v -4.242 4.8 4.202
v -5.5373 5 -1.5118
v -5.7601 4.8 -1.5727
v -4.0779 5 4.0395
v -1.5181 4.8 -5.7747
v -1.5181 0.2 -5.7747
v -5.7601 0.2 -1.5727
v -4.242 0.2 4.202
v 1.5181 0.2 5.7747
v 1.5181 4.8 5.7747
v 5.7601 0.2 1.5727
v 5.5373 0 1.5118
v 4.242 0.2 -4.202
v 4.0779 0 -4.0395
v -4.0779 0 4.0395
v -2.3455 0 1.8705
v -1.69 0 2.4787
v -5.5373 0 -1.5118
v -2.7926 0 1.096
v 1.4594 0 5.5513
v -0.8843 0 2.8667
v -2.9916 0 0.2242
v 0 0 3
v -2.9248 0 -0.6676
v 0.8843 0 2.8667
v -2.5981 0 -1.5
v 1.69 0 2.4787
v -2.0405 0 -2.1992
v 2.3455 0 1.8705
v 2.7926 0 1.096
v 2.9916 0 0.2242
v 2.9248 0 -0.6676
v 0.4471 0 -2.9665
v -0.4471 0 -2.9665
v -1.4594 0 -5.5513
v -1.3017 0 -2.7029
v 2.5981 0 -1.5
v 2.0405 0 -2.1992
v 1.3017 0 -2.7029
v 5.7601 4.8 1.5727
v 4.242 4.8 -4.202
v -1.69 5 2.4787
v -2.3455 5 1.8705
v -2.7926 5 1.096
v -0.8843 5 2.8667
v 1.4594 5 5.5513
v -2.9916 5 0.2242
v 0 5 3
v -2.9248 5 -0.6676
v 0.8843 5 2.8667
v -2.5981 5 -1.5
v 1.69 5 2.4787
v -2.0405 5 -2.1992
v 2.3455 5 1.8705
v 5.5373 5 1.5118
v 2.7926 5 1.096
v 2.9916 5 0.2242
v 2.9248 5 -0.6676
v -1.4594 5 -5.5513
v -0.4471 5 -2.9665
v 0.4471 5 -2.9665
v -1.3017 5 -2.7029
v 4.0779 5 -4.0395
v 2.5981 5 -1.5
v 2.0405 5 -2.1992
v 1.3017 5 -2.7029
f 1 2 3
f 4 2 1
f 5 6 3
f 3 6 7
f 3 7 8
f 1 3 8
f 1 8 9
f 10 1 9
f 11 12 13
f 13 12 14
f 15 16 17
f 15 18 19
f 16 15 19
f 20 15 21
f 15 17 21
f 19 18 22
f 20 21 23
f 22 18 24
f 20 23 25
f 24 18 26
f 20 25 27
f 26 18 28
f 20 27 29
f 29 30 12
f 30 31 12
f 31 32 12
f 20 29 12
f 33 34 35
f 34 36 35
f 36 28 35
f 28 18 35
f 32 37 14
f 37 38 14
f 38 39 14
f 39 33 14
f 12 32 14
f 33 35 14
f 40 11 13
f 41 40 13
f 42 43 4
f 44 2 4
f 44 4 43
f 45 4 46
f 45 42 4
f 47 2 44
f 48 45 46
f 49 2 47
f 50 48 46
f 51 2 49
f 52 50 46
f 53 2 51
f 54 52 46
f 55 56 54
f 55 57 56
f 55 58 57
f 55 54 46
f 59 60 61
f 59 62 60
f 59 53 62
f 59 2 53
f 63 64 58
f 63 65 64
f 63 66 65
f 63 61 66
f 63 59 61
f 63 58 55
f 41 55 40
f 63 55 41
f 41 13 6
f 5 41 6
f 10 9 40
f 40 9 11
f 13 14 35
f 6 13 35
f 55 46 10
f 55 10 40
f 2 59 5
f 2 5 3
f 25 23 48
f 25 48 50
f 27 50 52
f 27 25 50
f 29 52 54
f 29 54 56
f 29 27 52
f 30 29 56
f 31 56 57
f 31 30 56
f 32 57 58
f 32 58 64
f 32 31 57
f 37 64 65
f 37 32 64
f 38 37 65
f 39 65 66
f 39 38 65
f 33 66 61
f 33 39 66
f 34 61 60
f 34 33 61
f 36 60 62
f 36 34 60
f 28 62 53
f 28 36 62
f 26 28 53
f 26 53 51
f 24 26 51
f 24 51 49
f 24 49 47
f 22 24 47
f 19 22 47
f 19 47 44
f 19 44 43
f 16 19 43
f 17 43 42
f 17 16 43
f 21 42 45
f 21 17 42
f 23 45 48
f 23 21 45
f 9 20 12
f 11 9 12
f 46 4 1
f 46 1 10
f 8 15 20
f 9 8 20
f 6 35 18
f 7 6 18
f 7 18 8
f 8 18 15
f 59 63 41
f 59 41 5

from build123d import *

# Parameters (mm, degrees)
SKETCH1_R           = 3
BOSS_EXTRUDE1_DEPTH = 5
CHAMFER2_SIZE       = 0.2


with BuildPart() as part:
    # Sketch1 → Boss-Extrude1 (new body)
    with BuildSketch(Plane(origin=(0, 0, 0), x_dir=(1, 0, 0), z_dir=(0, 1, 0))):
        Polygon((-4.241992166, -4.202035335), (1.518073264, -5.774690646), (5.760065431, -1.572655311), (4.241992166, 4.202035335), (-1.518073264, 5.774690646), (-5.760065431, 1.572655311), align=None)
        with Locations(Location((0, 0, 0), (0, 0, 270))):
            Circle(SKETCH1_R, mode=Mode.SUBTRACT)
    extrude(amount=BOSS_EXTRUDE1_DEPTH)

    # Chamfer2
    chamfer2_edges = [part.edges().sort_by_distance(p)[0] for p in [
        (3.639069348, 5, 3.673672979),
        (5.001028798, 5, -1.314690012),
        (1.361959451, 5, -4.98836299),
        (-3.639069348, 5, -3.673672979),
        (-5.001028798, 5, 1.314690012),
        (-3.639069348, 0, -3.673672979),
        (1.361959451, 0, -4.98836299),
        (5.001028798, 0, -1.314690012),
        (-1.361959451, 5, 4.98836299),
        (3.639069348, 0, 3.673672979),
        (-1.361959451, 0, 4.98836299),
        (-5.001028798, 0, 1.314690012),
    ]]
    chamfer(chamfer2_edges, length=CHAMFER2_SIZE)


solid = part.part
